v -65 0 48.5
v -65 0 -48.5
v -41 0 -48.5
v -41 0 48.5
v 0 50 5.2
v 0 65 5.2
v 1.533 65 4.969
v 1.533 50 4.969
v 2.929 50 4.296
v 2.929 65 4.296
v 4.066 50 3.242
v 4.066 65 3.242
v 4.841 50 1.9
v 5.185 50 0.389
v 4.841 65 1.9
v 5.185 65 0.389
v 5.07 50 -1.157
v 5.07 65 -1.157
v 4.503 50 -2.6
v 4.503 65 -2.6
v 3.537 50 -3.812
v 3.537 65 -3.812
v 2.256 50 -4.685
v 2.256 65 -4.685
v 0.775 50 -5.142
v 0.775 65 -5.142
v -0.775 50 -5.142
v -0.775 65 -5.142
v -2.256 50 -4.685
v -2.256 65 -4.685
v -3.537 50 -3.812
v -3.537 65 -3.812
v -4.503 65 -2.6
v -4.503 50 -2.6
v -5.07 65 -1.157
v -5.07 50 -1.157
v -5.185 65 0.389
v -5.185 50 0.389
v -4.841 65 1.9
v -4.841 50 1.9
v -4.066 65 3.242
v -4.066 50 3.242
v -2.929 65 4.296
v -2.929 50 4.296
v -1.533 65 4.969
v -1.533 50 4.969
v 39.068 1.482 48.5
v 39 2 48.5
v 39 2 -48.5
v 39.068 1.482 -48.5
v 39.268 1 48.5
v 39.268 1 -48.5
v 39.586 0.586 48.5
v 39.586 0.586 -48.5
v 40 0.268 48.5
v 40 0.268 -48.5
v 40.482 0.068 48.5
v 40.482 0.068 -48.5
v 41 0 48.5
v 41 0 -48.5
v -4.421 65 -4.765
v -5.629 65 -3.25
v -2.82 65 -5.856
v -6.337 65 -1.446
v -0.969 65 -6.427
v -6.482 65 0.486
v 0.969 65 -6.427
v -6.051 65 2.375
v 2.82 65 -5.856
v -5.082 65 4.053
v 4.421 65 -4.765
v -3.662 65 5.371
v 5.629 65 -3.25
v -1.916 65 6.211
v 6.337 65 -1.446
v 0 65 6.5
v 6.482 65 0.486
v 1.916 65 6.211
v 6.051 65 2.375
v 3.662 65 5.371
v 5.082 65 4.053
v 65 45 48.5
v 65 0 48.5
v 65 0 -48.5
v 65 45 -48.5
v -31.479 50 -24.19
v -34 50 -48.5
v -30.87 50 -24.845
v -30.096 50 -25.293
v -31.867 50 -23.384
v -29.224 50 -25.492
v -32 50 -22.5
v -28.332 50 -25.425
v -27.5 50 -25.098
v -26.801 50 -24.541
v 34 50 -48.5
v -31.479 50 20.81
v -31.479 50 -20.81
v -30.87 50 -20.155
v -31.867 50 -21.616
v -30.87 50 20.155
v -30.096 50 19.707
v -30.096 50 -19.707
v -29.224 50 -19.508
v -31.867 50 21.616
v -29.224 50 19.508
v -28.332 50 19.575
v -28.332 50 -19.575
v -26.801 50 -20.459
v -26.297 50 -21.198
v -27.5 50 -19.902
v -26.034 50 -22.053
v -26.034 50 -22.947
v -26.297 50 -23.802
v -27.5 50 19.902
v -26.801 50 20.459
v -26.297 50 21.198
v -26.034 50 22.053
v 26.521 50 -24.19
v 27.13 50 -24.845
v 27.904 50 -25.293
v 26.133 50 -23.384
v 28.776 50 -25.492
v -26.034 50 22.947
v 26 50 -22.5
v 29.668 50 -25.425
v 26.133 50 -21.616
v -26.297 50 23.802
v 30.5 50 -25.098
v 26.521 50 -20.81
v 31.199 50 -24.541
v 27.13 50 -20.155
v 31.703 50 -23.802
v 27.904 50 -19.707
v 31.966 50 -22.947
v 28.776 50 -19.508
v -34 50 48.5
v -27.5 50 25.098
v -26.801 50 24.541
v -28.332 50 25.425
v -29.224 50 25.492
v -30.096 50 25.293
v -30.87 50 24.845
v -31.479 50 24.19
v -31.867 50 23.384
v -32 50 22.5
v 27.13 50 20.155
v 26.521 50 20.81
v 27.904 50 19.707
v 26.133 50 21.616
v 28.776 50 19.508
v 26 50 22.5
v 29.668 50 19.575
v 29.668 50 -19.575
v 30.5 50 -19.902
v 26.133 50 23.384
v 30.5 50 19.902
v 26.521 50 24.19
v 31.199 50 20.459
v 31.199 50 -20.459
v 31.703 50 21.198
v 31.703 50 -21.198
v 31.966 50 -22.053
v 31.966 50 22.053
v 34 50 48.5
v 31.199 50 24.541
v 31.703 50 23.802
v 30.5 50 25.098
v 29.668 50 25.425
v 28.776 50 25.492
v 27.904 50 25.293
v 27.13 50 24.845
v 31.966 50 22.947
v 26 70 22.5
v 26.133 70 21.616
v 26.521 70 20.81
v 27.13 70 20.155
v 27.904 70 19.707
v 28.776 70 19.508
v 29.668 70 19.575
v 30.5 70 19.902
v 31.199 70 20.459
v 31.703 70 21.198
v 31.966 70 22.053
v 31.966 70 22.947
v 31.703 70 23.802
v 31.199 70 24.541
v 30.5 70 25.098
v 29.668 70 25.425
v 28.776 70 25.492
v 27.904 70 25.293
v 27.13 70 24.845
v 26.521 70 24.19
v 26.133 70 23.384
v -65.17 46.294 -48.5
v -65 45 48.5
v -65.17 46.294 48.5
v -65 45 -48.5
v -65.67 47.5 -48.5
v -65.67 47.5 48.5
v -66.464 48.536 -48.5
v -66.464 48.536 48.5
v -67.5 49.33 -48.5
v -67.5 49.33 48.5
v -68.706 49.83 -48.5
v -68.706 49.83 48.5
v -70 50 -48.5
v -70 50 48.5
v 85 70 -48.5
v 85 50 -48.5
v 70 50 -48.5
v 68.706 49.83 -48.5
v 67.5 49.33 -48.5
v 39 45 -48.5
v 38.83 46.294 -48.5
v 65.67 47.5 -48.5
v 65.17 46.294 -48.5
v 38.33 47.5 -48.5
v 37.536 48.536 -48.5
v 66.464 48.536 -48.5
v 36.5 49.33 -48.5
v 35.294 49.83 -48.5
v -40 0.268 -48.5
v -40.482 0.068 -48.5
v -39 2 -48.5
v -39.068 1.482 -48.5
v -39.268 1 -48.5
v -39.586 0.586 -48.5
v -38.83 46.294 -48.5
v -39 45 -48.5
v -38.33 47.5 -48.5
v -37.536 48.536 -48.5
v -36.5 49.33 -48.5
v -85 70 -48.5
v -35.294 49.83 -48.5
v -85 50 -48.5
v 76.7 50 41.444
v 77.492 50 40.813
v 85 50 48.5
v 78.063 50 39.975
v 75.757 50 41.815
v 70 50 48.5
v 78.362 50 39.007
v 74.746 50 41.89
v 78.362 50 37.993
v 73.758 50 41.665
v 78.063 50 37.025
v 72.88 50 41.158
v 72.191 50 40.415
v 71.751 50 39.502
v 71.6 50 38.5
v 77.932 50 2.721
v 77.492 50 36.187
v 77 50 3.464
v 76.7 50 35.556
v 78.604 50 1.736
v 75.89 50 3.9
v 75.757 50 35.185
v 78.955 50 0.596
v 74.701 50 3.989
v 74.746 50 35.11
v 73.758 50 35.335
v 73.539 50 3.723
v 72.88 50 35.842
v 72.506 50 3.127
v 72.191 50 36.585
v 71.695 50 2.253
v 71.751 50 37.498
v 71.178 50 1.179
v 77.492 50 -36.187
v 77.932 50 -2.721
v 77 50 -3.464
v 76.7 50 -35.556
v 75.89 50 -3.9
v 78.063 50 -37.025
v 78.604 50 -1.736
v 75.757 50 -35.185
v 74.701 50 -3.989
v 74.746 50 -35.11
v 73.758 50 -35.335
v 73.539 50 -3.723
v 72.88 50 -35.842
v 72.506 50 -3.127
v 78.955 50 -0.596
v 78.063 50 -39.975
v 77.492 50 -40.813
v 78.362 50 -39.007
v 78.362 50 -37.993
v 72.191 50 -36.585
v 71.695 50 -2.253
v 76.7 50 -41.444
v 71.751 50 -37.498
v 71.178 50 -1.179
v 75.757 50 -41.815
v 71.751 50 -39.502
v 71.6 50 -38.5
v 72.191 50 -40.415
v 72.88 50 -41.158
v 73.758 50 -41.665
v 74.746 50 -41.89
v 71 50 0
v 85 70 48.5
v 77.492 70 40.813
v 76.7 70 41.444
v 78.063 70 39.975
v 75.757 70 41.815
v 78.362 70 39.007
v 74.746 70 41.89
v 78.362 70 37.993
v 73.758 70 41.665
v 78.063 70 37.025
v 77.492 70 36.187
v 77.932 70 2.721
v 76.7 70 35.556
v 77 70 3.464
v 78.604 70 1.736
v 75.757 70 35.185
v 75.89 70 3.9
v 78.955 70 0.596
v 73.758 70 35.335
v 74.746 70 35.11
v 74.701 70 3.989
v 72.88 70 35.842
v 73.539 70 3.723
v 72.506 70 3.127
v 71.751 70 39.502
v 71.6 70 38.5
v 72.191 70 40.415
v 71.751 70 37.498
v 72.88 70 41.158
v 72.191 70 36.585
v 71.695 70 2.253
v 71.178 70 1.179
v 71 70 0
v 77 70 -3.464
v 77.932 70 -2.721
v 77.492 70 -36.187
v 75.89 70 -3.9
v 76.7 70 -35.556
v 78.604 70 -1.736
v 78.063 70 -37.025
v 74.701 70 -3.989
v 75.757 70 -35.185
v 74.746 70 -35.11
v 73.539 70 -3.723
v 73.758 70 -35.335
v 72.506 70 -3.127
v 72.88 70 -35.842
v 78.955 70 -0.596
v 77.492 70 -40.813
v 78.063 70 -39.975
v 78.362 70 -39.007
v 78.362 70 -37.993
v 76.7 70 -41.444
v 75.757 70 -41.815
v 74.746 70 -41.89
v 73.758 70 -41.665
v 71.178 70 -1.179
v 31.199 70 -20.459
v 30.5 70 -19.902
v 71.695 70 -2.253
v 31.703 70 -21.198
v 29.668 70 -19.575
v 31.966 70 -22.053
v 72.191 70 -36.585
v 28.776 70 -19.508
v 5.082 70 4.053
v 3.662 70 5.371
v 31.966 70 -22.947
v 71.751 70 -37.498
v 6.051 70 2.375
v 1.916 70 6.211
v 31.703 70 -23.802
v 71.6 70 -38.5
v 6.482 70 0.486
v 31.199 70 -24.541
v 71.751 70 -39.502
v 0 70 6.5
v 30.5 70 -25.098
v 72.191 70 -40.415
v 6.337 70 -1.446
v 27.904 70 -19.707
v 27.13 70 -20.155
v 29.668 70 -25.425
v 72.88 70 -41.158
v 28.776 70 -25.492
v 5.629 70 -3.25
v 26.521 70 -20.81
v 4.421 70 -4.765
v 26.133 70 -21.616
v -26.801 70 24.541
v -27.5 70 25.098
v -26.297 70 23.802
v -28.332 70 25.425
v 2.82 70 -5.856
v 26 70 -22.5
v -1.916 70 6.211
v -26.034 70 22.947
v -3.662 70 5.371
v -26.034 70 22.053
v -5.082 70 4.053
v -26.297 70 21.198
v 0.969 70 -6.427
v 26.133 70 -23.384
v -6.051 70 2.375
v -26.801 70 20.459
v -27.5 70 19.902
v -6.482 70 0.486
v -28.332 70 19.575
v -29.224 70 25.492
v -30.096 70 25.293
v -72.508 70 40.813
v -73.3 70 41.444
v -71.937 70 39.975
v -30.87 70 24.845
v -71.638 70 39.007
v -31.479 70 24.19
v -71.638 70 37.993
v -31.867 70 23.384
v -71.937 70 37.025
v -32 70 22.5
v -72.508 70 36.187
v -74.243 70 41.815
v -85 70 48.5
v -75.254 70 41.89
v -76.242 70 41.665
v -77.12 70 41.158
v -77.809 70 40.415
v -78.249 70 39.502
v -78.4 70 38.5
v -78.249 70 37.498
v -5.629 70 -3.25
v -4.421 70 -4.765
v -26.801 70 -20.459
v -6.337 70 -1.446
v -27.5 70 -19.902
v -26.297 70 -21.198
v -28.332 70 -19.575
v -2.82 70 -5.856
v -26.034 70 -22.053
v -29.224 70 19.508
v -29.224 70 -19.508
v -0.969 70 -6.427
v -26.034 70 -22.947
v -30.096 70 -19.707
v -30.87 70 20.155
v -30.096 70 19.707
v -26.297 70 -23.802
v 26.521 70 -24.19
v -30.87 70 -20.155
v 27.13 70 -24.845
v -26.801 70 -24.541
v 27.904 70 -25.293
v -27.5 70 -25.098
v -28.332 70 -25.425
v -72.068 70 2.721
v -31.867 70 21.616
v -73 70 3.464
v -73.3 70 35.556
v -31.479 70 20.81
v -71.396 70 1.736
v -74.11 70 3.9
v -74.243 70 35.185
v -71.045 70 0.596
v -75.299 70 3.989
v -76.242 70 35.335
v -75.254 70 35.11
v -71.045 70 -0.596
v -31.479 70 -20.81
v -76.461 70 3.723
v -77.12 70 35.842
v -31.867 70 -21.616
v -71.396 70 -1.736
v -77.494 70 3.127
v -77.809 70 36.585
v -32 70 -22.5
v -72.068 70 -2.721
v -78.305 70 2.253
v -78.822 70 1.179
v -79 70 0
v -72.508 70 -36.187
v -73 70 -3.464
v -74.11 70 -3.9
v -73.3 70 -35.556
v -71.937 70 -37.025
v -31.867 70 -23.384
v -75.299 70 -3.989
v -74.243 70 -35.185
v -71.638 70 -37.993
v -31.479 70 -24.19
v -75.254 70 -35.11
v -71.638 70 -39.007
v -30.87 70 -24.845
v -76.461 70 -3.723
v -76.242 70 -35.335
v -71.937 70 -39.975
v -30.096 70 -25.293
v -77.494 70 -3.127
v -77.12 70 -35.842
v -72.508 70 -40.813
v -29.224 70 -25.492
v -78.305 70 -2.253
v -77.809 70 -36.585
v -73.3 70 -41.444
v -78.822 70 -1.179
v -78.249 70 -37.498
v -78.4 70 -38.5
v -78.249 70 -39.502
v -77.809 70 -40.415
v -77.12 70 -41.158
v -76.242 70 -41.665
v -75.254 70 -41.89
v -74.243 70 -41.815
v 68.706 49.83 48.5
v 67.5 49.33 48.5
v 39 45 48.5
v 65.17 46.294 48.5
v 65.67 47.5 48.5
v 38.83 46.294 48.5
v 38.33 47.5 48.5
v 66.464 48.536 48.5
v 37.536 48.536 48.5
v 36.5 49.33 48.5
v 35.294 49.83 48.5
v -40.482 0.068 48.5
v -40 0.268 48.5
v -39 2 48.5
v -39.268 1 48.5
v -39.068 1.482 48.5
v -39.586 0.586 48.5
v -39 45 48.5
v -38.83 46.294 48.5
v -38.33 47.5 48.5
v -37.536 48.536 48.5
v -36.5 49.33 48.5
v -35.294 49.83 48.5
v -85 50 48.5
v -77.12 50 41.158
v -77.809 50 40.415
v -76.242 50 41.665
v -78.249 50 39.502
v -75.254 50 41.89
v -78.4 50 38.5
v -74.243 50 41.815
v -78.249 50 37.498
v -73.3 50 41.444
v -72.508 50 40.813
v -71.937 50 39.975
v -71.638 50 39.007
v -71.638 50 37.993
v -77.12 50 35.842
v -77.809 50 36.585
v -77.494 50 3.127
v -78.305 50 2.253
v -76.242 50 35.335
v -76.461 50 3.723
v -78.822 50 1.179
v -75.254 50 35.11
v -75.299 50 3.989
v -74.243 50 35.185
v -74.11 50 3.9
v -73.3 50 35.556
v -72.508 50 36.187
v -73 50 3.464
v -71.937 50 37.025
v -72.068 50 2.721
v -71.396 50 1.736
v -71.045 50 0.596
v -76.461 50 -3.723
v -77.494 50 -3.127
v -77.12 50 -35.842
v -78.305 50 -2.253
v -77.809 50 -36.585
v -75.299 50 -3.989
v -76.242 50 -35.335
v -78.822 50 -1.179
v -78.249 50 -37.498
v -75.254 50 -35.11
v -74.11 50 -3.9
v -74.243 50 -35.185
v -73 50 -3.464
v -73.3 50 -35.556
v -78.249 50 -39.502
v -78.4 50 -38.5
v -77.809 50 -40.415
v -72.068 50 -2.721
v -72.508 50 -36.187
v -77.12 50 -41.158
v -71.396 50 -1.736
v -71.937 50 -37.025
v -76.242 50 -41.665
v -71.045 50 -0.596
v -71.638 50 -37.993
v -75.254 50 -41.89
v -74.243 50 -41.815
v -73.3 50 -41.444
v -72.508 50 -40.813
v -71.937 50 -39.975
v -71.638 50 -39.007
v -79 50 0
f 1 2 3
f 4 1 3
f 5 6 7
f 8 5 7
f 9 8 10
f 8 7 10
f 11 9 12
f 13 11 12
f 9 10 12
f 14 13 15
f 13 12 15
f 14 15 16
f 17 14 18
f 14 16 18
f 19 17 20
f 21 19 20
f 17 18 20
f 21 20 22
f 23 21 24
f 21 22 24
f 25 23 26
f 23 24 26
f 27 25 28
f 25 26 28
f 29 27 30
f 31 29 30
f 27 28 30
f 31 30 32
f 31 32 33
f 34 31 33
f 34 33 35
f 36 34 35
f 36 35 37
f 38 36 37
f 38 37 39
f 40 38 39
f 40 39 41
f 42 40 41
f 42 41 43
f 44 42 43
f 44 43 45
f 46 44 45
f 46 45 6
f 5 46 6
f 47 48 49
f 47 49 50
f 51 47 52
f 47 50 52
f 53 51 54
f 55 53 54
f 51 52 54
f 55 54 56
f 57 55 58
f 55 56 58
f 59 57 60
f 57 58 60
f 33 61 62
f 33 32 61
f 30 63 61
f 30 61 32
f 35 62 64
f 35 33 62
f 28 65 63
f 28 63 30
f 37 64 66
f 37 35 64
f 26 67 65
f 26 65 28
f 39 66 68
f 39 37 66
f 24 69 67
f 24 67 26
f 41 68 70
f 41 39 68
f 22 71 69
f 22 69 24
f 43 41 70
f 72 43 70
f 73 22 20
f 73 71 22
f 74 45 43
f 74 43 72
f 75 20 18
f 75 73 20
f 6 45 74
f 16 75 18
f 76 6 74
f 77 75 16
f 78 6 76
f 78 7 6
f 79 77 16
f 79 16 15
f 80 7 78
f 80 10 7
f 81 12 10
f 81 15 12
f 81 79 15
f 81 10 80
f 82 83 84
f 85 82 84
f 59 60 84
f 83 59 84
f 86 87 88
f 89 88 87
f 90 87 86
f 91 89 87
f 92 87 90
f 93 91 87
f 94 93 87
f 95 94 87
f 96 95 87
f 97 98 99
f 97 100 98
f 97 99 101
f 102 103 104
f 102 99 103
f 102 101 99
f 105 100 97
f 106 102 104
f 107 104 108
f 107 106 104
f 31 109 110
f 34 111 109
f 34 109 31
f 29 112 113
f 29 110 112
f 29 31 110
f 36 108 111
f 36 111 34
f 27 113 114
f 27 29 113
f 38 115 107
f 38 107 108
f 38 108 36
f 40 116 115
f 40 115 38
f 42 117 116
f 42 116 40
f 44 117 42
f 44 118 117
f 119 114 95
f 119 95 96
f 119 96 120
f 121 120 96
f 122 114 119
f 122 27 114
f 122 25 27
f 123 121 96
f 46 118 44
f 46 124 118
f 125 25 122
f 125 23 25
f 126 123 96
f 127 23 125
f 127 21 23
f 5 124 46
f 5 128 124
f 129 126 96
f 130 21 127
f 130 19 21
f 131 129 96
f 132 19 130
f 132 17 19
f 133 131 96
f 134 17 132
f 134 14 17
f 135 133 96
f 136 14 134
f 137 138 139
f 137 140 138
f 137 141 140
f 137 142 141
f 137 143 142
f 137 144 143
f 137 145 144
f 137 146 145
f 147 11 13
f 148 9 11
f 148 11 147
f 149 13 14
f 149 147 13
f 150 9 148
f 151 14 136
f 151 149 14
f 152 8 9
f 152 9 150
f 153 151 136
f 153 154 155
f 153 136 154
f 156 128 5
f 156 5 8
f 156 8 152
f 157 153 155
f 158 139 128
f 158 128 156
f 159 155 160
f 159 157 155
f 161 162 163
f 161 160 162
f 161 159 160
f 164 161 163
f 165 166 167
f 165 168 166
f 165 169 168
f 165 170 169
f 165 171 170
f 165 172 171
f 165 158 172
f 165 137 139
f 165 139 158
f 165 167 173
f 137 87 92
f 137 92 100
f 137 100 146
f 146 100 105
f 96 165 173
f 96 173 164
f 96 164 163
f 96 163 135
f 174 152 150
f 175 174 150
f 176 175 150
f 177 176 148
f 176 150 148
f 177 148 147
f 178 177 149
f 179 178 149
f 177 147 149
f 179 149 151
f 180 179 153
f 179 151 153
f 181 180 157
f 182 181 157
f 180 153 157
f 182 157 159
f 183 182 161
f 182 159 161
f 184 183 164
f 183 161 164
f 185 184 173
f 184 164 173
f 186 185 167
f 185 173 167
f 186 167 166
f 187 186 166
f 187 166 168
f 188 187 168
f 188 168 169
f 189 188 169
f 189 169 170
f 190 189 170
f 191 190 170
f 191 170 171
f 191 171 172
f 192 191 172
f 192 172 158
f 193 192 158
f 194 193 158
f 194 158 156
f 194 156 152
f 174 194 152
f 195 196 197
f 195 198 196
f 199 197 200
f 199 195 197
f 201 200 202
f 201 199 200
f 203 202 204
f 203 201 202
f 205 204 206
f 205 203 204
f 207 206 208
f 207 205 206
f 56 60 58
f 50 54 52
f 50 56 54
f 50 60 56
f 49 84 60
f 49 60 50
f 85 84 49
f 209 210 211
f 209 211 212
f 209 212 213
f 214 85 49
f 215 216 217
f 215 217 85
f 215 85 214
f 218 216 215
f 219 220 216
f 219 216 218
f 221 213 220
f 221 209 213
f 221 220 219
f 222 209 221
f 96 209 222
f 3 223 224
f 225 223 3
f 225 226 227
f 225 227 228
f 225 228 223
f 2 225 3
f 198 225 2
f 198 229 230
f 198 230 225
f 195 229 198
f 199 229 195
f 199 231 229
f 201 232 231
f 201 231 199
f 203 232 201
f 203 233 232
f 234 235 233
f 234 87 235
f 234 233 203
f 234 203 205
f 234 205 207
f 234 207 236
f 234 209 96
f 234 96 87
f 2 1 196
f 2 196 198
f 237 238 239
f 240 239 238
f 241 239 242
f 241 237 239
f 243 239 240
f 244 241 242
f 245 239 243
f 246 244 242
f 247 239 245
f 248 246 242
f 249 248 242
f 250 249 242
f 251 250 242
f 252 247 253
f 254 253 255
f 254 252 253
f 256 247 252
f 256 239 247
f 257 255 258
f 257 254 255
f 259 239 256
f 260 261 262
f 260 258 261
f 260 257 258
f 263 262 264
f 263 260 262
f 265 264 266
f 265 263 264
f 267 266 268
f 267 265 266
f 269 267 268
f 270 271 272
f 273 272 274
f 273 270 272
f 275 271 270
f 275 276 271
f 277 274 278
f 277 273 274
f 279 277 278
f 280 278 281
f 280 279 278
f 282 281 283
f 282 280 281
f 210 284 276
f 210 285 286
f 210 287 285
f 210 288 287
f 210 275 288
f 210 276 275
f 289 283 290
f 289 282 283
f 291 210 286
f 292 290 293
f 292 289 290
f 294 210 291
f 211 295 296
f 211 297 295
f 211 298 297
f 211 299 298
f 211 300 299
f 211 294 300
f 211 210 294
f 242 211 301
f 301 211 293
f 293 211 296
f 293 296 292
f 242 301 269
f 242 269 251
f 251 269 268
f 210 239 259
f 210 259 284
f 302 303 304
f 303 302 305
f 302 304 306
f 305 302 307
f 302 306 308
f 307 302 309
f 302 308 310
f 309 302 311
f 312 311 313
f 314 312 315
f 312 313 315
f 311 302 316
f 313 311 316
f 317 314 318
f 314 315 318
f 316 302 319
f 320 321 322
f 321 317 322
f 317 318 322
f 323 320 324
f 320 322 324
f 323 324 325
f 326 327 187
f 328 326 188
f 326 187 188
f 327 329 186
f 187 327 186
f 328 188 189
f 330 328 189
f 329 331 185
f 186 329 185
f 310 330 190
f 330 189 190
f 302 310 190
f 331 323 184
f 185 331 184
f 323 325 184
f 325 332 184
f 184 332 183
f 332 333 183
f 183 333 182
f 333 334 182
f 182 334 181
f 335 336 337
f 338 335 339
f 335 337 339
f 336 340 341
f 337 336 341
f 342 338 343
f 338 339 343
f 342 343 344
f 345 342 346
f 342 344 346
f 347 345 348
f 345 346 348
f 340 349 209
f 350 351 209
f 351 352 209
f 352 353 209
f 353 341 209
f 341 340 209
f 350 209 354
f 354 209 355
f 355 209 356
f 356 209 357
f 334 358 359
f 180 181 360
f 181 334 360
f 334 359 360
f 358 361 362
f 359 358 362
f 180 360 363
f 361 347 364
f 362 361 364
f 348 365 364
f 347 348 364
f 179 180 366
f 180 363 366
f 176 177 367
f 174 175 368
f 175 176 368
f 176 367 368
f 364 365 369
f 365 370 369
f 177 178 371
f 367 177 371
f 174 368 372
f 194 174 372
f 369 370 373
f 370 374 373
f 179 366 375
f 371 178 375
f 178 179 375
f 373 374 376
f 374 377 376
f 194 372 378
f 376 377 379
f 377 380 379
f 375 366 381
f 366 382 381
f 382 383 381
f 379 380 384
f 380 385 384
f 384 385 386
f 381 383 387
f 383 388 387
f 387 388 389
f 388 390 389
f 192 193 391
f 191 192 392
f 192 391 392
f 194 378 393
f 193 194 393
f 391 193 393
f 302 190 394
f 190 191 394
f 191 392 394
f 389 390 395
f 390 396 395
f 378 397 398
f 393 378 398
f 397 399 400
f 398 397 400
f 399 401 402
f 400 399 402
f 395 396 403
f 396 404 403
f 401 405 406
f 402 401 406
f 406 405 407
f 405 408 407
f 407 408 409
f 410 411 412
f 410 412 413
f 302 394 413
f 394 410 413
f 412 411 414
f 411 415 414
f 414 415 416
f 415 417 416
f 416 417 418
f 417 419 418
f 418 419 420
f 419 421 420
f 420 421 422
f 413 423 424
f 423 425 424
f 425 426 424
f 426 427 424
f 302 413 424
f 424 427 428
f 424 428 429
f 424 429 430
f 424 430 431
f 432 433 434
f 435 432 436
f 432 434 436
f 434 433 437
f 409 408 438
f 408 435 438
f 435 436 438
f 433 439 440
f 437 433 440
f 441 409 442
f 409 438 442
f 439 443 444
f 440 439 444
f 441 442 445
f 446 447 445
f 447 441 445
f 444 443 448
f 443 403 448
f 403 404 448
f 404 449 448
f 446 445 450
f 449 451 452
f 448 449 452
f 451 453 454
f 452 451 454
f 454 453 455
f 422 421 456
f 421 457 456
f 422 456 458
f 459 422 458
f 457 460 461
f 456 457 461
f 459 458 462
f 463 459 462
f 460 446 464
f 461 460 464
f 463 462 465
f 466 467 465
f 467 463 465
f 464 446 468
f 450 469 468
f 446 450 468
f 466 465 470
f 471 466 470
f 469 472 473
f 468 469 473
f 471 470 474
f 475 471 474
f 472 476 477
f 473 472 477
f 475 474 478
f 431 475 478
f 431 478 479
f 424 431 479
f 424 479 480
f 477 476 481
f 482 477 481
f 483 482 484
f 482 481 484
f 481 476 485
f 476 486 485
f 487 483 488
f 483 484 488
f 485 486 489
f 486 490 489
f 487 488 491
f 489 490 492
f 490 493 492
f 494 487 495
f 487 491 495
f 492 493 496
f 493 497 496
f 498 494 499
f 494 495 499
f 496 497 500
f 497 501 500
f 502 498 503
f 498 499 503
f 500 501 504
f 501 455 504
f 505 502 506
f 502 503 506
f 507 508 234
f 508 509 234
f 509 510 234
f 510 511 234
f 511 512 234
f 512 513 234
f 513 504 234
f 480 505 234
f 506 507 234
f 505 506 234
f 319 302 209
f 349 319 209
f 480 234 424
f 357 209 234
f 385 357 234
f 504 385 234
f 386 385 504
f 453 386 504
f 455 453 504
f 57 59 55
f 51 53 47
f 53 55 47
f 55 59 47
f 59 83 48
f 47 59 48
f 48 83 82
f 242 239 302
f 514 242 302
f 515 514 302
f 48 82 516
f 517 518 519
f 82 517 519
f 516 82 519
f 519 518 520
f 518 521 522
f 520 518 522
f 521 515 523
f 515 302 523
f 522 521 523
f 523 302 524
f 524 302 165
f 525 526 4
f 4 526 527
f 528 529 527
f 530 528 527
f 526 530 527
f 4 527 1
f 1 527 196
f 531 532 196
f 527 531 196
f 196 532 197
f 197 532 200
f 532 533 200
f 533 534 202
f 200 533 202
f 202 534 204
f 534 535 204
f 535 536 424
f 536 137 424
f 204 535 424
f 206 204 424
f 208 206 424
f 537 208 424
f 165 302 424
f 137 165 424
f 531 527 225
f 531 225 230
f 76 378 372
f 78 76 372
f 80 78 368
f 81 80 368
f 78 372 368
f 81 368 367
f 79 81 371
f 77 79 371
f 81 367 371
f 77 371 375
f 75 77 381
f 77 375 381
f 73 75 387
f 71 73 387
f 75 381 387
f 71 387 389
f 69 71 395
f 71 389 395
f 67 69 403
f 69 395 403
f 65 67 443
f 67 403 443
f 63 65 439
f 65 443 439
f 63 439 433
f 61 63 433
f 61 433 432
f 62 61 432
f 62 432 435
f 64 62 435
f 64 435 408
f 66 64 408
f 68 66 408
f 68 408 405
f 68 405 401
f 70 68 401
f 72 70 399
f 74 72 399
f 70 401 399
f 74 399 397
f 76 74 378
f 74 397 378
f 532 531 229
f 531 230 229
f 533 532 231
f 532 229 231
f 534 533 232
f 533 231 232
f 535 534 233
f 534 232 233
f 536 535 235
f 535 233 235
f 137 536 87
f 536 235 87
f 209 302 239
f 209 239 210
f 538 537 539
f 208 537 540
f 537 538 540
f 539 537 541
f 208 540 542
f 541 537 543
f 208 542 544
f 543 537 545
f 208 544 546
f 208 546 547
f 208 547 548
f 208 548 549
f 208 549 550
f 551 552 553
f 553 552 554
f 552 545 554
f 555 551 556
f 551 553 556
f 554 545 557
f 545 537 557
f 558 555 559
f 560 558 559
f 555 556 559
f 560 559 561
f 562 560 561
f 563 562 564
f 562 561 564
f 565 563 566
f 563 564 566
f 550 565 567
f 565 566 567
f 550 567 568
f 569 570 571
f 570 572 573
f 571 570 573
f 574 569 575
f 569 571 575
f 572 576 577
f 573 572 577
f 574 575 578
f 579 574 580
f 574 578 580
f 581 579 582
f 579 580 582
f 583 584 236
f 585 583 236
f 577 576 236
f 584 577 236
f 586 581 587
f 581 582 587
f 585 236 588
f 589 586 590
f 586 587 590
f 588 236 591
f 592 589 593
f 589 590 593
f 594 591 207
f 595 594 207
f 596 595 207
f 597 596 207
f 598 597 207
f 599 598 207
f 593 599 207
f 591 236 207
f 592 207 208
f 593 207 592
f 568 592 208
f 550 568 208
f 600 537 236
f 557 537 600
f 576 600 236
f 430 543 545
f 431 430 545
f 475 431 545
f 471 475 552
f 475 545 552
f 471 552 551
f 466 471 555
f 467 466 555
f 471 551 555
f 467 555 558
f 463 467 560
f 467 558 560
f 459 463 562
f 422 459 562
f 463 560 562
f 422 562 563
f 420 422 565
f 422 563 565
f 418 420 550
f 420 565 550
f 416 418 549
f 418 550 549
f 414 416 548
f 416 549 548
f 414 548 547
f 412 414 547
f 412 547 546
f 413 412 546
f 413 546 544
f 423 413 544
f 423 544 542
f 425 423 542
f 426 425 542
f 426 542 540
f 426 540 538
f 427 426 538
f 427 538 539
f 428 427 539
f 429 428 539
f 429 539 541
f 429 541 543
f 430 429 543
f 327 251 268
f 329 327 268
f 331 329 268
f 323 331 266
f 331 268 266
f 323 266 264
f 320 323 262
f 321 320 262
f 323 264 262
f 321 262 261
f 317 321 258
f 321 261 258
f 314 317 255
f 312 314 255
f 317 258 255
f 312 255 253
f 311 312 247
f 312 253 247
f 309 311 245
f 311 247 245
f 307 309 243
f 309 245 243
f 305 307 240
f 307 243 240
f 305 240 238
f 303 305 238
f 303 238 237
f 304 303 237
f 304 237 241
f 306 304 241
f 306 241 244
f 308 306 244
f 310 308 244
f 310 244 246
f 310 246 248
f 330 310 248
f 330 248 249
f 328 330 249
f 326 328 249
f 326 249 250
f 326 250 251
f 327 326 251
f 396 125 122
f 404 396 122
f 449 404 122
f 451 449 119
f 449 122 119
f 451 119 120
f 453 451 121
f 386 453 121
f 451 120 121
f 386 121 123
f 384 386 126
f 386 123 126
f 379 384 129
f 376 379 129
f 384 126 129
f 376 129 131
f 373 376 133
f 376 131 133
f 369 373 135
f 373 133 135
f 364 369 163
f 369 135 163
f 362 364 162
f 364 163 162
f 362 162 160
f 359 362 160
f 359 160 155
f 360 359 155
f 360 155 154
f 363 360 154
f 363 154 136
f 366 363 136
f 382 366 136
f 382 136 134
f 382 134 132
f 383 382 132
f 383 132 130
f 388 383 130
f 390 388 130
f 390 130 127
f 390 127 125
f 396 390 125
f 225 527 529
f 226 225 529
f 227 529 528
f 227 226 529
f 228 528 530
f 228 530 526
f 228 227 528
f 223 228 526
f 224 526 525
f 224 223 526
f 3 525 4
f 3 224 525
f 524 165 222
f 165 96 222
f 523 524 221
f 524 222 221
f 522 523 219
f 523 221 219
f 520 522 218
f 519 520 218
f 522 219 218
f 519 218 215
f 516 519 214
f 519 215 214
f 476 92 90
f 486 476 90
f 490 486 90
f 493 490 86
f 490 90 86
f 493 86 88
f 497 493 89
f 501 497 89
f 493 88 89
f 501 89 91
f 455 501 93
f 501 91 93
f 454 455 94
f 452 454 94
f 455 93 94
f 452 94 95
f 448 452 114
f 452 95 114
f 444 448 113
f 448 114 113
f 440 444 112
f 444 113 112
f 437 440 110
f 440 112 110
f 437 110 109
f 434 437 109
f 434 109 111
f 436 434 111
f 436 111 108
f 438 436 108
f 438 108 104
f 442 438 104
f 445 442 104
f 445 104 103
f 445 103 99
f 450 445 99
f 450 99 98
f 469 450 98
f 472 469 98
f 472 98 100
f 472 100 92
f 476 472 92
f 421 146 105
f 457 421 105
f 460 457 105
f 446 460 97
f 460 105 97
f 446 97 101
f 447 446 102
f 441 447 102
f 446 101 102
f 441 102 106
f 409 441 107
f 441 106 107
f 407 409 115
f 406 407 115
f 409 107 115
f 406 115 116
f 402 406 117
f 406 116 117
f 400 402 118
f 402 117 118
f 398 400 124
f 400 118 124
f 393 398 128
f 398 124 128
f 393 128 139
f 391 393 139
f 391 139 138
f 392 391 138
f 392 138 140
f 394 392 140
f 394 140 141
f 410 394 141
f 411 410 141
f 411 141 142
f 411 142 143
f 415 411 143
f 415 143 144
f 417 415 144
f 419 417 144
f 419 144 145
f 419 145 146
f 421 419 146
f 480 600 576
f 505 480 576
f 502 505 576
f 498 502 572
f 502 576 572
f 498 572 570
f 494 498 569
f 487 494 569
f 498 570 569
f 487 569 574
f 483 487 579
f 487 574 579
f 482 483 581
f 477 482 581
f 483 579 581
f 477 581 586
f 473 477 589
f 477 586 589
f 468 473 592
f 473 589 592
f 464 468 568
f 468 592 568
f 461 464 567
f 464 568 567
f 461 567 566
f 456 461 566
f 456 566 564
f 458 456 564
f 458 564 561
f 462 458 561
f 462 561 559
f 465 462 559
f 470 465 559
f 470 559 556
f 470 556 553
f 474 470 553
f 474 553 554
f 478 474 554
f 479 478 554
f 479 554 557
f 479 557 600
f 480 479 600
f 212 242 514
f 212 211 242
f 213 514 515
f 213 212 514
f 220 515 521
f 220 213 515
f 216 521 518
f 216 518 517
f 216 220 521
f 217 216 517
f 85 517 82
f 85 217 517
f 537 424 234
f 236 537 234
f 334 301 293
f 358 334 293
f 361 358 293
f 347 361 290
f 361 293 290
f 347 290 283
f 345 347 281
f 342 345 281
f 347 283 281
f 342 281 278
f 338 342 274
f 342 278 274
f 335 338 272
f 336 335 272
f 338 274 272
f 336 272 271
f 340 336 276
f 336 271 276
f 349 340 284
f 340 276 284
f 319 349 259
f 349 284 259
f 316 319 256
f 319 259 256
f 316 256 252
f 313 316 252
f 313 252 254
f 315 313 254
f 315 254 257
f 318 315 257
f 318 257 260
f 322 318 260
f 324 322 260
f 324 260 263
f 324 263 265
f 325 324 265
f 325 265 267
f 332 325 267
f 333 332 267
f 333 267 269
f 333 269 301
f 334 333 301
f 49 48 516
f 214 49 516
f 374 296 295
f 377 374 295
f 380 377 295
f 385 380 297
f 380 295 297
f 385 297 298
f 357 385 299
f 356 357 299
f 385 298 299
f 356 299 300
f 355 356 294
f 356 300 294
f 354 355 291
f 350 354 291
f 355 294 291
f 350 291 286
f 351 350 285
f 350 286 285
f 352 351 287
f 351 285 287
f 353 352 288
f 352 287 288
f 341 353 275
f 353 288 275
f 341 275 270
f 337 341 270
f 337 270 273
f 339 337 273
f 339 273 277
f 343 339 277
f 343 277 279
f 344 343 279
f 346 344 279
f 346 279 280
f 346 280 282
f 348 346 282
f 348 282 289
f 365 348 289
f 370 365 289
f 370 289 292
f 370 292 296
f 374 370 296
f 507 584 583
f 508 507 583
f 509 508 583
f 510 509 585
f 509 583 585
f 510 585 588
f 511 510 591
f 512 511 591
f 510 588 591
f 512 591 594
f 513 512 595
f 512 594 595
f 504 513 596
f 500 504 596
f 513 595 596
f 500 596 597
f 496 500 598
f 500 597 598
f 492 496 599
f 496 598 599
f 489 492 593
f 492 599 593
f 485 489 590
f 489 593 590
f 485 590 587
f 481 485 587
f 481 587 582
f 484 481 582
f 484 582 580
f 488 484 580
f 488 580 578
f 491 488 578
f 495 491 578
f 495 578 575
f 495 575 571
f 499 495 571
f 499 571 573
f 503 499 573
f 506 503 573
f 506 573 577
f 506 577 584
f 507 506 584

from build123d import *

# Parameters (mm, degrees)
SKETCH1_W                = 130
SKETCH1_H                = 97
BOSS_EXTRUDE1_DEPTH      = 70
SKETCH2_W                = 78
SKETCH2_H                = 50
CUT_EXTRUDE1_DEPTH       = 137.1396342
FILLET3_R                = 5
SKETCH3_R                = 5.2
CUT_EXTRUDE2_DEPTH       = 108.131928014
SKETCH4_R                = 6.5
CUT_EXTRUDE3_DEPTH       = 5
FILLET4_R                = 2
F_5_0_5_DIAMETER_HOLE1_D = 6
SKETCH8_W                = 20
SKETCH8_H                = 97
BOSS_EXTRUDE2_DEPTH      = 20
FILLET5_R                = 5
M8_TAPPED_HOLE1_D        = 6.8
F_8_0MM_DOWEL_HOLE1_D    = 8


with BuildPart() as part:
    # Sketch1 → Boss-Extrude1 (new body)
    with BuildSketch(Plane(origin=(0, 0, 0), x_dir=(1, 0, 0), z_dir=(0, 1, 0))):
        Rectangle(SKETCH1_W, SKETCH1_H)
    extrude(amount=BOSS_EXTRUDE1_DEPTH)

    # Sketch2 → Cut-Extrude1 (cut, through all)
    with BuildSketch(Plane.XY.offset(48.5)):
        with Locations((0, 25)):
            Rectangle(SKETCH2_W, SKETCH2_H)
    extrude(amount=-CUT_EXTRUDE1_DEPTH, mode=Mode.SUBTRACT)

    # Fillet3
    fillet3_edges = [part.edges().sort_by_distance(p)[0] for p in [
        (-39, 50, 0),
        (39, 50, 0),
    ]]
    fillet(fillet3_edges, radius=FILLET3_R)

    # Sketch3 → Cut-Extrude2 (cut, through all)
    with BuildSketch(Plane(origin=(0, 70, 0), x_dir=(1, 0, 0), z_dir=(0, 1, 0))):
        with Locations(Location((0, 0, 0), (0, 0, 270))):
            Circle(SKETCH3_R)
    extrude(amount=-CUT_EXTRUDE2_DEPTH, mode=Mode.SUBTRACT)

    # Sketch4 → Cut-Extrude3 (cut)
    with BuildSketch(Plane(origin=(0, 70, 0), x_dir=(1, 0, 0), z_dir=(0, 1, 0))):
        with Locations(Location((0, 0, 0), (0, 0, 270))):
            Circle(SKETCH4_R)
    extrude(amount=-CUT_EXTRUDE3_DEPTH, mode=Mode.SUBTRACT)

    # Fillet4
    fillet4_edges = [part.edges().sort_by_distance(p)[0] for p in [
        (-39, 0, 0),
        (39, 0, 0),
    ]]
    fillet(fillet4_edges, radius=FILLET4_R)

    # Ø5.0 (5) Diameter Hole1 (through all)
    with Locations(Plane(origin=(0, 70, 0), x_dir=(1, 0, 0), z_dir=(0, 1, 0))):
        with Locations((-29, 22.5), (29, 22.5), (29, -22.5), (-29, -22.5)):
            Hole(F_5_0_5_DIAMETER_HOLE1_D / 2)

    # Sketch8 → Boss-Extrude2 (add)
    with BuildSketch(Plane(origin=(0, 70, 0), x_dir=(1, 0, 0), z_dir=(0, 1, 0))):
        with Locations((-75, 0)):
            Rectangle(SKETCH8_W, SKETCH8_H)
    boss_extrude2 = extrude(amount=-BOSS_EXTRUDE2_DEPTH)

    # Mirror1: Boss-Extrude2 across plane
    add(boss_extrude2.mirror(Plane(origin=(0, 0, 0), x_dir=(0, 0, 1), z_dir=(1, 0, 0))))

    # Fillet5
    fillet5_edges = [part.edges().sort_by_distance(p)[0] for p in [
        (65, 50, 0),
        (-65, 50, 0),
    ]]
    fillet(fillet5_edges, radius=FILLET5_R)

    # M8 Tapped Hole1 (through all)
    with Locations(Plane(origin=(0, 70, 0), x_dir=(1, 0, 0), z_dir=(0, 1, 0))):
        with Locations((-75, 38.5), (-75, -38.5), (75, -38.5), (75, 38.5)):
            Hole(M8_TAPPED_HOLE1_D / 2)

    # Ø8.0mm Dowel Hole1 (through all)
    with Locations(Plane(origin=(0, 70, 0), x_dir=(1, 0, 0), z_dir=(0, 1, 0))):
        with Locations((-75, 0), (75, 0)):
            Hole(F_8_0MM_DOWEL_HOLE1_D / 2)


solid = part.part
